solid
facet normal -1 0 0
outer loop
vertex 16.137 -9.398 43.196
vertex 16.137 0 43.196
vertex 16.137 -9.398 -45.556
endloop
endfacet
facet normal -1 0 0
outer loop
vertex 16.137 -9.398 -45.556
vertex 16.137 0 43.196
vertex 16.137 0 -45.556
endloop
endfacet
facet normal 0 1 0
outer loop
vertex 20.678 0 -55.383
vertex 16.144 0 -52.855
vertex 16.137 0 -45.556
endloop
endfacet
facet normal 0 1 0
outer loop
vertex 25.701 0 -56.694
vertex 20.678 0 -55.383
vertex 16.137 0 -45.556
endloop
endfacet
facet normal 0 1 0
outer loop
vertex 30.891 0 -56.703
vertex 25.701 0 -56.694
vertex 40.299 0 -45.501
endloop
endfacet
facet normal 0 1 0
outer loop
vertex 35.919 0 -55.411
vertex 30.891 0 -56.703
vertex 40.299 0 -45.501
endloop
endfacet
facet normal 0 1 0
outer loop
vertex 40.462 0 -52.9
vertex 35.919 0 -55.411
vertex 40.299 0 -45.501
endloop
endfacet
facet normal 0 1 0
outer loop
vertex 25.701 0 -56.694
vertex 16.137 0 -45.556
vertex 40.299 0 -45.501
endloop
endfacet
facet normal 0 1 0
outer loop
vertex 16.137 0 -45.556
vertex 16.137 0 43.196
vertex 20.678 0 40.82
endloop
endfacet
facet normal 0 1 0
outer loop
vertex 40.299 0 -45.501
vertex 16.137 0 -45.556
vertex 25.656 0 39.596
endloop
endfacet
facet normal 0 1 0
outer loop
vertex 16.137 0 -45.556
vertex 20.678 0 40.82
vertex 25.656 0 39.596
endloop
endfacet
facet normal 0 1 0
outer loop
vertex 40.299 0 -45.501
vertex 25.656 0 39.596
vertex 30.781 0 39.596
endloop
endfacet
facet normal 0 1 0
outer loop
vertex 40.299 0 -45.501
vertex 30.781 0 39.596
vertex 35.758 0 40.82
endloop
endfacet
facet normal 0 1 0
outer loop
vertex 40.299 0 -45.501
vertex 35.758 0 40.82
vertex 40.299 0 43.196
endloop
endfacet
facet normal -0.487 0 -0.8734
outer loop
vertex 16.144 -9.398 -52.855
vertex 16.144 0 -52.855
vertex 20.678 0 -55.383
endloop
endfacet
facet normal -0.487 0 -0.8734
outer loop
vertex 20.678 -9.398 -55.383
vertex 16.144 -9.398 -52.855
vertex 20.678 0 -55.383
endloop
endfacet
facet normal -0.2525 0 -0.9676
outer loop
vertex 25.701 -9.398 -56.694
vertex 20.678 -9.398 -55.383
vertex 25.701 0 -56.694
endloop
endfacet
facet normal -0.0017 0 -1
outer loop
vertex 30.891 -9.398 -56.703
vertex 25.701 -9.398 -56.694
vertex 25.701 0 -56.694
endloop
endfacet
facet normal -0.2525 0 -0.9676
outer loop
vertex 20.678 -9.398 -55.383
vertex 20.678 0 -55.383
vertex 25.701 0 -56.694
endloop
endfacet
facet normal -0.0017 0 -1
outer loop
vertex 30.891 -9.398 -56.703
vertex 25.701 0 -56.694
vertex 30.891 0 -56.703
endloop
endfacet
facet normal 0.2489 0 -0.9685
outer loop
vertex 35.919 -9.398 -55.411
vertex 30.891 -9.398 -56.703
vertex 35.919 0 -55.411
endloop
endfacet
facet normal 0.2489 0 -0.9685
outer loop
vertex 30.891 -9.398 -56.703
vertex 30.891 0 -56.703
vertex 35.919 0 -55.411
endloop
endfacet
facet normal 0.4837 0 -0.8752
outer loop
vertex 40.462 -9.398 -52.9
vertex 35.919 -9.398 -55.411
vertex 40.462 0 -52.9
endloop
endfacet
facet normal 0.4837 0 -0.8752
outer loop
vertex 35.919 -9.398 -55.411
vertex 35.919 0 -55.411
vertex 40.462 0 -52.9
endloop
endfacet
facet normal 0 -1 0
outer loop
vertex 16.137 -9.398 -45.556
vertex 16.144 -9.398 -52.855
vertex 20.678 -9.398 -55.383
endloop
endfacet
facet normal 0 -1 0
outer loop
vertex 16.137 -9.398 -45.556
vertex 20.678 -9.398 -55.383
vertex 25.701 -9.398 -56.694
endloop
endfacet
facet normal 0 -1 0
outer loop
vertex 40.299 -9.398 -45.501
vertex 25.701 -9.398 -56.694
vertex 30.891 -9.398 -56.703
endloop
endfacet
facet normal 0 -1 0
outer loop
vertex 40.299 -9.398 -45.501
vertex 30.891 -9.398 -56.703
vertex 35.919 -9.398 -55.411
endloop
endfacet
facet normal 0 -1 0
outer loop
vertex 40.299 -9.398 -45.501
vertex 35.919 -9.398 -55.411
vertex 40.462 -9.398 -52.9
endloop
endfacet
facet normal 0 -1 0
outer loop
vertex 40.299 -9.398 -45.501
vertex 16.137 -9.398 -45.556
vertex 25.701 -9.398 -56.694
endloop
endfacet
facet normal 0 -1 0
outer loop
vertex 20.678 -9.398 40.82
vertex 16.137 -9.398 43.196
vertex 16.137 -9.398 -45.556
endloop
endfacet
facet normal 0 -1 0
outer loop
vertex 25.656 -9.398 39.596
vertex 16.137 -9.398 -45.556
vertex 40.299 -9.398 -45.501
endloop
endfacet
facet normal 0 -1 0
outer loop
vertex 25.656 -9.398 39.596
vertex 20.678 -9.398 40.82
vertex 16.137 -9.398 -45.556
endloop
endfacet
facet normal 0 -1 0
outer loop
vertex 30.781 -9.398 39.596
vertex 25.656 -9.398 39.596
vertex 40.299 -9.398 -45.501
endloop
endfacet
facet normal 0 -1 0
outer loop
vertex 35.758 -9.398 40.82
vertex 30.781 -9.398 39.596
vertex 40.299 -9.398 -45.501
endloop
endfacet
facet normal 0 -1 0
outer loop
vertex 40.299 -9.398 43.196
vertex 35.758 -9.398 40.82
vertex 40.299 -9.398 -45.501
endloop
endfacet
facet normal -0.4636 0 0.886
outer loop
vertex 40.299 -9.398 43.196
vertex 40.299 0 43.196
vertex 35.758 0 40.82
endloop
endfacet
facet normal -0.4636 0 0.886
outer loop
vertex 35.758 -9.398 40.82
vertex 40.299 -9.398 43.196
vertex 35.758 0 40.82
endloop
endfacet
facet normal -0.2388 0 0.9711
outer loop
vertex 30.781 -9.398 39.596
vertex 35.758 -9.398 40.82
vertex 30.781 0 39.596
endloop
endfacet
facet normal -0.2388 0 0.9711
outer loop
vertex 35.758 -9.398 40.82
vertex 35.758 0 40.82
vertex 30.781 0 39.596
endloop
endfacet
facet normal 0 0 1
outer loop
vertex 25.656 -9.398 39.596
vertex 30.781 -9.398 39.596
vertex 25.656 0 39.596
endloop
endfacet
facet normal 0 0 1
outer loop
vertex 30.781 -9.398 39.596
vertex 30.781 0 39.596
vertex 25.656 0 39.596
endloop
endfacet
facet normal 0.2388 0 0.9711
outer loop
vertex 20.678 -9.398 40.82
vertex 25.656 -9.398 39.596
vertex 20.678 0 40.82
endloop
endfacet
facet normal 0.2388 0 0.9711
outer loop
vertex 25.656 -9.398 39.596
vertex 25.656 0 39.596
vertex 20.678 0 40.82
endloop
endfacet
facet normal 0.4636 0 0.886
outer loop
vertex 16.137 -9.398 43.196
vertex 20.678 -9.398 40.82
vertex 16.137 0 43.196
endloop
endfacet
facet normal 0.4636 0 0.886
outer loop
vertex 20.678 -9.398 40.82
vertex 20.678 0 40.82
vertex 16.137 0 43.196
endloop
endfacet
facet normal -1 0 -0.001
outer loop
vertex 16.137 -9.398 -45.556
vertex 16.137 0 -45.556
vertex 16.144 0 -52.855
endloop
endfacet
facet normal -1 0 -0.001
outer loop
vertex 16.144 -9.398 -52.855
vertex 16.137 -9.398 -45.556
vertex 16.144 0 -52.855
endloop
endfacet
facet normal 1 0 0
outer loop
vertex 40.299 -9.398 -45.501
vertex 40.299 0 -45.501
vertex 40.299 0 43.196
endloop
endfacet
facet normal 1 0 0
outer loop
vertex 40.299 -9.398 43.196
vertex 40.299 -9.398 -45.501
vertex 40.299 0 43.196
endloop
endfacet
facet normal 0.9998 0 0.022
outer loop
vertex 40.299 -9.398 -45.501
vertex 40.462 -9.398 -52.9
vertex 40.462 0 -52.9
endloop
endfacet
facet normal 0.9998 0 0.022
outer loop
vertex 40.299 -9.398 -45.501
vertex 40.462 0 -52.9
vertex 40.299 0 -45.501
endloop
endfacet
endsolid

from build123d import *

# Parameters (mm, degrees)
F1_DEPTH = 9.398


with BuildPart() as f1:
    # F0 (on Front) → F1 (new body)
    with BuildSketch(Plane.XZ):
        with BuildLine():
            Line((16.137162, 43.196354), (16.137162, 34.891911))
            ThreePointArc((16.137162, 34.891911), (28.218261, 32.258096), (40.29936, 34.891911))
            Line((40.29936, 34.891911), (40.29936, 43.196354))
            ThreePointArc((40.29936, 43.196354), (28.218261, 39.441099), (16.137162, 43.196354))
        make_face()
        with BuildLine():
            ThreePointArc((40.29936, -45.501441), (28.231979, -51.583741), (16.137162, -45.556184))
            Line((16.137162, -45.556184), (16.144373, -52.855063))
            ThreePointArc((16.144373, -52.855063), (28.295737, -56.862997), (40.46179, -52.899871))
            Line((40.46179, -52.899871), (40.29936, -45.501441))
        make_face()
        with BuildLine():
            ThreePointArc((40.29936, 34.891911), (28.218261, 32.258096), (16.137162, 34.891911))
            Line((16.137162, 34.891911), (16.137162, -45.556184))
            ThreePointArc((16.137162, -45.556184), (28.231979, -51.583741), (40.29936, -45.501441))
            Line((40.29936, -45.501441), (40.29936, 34.891911))
        make_face()
    extrude(amount=F1_DEPTH)


solid = f1.part
